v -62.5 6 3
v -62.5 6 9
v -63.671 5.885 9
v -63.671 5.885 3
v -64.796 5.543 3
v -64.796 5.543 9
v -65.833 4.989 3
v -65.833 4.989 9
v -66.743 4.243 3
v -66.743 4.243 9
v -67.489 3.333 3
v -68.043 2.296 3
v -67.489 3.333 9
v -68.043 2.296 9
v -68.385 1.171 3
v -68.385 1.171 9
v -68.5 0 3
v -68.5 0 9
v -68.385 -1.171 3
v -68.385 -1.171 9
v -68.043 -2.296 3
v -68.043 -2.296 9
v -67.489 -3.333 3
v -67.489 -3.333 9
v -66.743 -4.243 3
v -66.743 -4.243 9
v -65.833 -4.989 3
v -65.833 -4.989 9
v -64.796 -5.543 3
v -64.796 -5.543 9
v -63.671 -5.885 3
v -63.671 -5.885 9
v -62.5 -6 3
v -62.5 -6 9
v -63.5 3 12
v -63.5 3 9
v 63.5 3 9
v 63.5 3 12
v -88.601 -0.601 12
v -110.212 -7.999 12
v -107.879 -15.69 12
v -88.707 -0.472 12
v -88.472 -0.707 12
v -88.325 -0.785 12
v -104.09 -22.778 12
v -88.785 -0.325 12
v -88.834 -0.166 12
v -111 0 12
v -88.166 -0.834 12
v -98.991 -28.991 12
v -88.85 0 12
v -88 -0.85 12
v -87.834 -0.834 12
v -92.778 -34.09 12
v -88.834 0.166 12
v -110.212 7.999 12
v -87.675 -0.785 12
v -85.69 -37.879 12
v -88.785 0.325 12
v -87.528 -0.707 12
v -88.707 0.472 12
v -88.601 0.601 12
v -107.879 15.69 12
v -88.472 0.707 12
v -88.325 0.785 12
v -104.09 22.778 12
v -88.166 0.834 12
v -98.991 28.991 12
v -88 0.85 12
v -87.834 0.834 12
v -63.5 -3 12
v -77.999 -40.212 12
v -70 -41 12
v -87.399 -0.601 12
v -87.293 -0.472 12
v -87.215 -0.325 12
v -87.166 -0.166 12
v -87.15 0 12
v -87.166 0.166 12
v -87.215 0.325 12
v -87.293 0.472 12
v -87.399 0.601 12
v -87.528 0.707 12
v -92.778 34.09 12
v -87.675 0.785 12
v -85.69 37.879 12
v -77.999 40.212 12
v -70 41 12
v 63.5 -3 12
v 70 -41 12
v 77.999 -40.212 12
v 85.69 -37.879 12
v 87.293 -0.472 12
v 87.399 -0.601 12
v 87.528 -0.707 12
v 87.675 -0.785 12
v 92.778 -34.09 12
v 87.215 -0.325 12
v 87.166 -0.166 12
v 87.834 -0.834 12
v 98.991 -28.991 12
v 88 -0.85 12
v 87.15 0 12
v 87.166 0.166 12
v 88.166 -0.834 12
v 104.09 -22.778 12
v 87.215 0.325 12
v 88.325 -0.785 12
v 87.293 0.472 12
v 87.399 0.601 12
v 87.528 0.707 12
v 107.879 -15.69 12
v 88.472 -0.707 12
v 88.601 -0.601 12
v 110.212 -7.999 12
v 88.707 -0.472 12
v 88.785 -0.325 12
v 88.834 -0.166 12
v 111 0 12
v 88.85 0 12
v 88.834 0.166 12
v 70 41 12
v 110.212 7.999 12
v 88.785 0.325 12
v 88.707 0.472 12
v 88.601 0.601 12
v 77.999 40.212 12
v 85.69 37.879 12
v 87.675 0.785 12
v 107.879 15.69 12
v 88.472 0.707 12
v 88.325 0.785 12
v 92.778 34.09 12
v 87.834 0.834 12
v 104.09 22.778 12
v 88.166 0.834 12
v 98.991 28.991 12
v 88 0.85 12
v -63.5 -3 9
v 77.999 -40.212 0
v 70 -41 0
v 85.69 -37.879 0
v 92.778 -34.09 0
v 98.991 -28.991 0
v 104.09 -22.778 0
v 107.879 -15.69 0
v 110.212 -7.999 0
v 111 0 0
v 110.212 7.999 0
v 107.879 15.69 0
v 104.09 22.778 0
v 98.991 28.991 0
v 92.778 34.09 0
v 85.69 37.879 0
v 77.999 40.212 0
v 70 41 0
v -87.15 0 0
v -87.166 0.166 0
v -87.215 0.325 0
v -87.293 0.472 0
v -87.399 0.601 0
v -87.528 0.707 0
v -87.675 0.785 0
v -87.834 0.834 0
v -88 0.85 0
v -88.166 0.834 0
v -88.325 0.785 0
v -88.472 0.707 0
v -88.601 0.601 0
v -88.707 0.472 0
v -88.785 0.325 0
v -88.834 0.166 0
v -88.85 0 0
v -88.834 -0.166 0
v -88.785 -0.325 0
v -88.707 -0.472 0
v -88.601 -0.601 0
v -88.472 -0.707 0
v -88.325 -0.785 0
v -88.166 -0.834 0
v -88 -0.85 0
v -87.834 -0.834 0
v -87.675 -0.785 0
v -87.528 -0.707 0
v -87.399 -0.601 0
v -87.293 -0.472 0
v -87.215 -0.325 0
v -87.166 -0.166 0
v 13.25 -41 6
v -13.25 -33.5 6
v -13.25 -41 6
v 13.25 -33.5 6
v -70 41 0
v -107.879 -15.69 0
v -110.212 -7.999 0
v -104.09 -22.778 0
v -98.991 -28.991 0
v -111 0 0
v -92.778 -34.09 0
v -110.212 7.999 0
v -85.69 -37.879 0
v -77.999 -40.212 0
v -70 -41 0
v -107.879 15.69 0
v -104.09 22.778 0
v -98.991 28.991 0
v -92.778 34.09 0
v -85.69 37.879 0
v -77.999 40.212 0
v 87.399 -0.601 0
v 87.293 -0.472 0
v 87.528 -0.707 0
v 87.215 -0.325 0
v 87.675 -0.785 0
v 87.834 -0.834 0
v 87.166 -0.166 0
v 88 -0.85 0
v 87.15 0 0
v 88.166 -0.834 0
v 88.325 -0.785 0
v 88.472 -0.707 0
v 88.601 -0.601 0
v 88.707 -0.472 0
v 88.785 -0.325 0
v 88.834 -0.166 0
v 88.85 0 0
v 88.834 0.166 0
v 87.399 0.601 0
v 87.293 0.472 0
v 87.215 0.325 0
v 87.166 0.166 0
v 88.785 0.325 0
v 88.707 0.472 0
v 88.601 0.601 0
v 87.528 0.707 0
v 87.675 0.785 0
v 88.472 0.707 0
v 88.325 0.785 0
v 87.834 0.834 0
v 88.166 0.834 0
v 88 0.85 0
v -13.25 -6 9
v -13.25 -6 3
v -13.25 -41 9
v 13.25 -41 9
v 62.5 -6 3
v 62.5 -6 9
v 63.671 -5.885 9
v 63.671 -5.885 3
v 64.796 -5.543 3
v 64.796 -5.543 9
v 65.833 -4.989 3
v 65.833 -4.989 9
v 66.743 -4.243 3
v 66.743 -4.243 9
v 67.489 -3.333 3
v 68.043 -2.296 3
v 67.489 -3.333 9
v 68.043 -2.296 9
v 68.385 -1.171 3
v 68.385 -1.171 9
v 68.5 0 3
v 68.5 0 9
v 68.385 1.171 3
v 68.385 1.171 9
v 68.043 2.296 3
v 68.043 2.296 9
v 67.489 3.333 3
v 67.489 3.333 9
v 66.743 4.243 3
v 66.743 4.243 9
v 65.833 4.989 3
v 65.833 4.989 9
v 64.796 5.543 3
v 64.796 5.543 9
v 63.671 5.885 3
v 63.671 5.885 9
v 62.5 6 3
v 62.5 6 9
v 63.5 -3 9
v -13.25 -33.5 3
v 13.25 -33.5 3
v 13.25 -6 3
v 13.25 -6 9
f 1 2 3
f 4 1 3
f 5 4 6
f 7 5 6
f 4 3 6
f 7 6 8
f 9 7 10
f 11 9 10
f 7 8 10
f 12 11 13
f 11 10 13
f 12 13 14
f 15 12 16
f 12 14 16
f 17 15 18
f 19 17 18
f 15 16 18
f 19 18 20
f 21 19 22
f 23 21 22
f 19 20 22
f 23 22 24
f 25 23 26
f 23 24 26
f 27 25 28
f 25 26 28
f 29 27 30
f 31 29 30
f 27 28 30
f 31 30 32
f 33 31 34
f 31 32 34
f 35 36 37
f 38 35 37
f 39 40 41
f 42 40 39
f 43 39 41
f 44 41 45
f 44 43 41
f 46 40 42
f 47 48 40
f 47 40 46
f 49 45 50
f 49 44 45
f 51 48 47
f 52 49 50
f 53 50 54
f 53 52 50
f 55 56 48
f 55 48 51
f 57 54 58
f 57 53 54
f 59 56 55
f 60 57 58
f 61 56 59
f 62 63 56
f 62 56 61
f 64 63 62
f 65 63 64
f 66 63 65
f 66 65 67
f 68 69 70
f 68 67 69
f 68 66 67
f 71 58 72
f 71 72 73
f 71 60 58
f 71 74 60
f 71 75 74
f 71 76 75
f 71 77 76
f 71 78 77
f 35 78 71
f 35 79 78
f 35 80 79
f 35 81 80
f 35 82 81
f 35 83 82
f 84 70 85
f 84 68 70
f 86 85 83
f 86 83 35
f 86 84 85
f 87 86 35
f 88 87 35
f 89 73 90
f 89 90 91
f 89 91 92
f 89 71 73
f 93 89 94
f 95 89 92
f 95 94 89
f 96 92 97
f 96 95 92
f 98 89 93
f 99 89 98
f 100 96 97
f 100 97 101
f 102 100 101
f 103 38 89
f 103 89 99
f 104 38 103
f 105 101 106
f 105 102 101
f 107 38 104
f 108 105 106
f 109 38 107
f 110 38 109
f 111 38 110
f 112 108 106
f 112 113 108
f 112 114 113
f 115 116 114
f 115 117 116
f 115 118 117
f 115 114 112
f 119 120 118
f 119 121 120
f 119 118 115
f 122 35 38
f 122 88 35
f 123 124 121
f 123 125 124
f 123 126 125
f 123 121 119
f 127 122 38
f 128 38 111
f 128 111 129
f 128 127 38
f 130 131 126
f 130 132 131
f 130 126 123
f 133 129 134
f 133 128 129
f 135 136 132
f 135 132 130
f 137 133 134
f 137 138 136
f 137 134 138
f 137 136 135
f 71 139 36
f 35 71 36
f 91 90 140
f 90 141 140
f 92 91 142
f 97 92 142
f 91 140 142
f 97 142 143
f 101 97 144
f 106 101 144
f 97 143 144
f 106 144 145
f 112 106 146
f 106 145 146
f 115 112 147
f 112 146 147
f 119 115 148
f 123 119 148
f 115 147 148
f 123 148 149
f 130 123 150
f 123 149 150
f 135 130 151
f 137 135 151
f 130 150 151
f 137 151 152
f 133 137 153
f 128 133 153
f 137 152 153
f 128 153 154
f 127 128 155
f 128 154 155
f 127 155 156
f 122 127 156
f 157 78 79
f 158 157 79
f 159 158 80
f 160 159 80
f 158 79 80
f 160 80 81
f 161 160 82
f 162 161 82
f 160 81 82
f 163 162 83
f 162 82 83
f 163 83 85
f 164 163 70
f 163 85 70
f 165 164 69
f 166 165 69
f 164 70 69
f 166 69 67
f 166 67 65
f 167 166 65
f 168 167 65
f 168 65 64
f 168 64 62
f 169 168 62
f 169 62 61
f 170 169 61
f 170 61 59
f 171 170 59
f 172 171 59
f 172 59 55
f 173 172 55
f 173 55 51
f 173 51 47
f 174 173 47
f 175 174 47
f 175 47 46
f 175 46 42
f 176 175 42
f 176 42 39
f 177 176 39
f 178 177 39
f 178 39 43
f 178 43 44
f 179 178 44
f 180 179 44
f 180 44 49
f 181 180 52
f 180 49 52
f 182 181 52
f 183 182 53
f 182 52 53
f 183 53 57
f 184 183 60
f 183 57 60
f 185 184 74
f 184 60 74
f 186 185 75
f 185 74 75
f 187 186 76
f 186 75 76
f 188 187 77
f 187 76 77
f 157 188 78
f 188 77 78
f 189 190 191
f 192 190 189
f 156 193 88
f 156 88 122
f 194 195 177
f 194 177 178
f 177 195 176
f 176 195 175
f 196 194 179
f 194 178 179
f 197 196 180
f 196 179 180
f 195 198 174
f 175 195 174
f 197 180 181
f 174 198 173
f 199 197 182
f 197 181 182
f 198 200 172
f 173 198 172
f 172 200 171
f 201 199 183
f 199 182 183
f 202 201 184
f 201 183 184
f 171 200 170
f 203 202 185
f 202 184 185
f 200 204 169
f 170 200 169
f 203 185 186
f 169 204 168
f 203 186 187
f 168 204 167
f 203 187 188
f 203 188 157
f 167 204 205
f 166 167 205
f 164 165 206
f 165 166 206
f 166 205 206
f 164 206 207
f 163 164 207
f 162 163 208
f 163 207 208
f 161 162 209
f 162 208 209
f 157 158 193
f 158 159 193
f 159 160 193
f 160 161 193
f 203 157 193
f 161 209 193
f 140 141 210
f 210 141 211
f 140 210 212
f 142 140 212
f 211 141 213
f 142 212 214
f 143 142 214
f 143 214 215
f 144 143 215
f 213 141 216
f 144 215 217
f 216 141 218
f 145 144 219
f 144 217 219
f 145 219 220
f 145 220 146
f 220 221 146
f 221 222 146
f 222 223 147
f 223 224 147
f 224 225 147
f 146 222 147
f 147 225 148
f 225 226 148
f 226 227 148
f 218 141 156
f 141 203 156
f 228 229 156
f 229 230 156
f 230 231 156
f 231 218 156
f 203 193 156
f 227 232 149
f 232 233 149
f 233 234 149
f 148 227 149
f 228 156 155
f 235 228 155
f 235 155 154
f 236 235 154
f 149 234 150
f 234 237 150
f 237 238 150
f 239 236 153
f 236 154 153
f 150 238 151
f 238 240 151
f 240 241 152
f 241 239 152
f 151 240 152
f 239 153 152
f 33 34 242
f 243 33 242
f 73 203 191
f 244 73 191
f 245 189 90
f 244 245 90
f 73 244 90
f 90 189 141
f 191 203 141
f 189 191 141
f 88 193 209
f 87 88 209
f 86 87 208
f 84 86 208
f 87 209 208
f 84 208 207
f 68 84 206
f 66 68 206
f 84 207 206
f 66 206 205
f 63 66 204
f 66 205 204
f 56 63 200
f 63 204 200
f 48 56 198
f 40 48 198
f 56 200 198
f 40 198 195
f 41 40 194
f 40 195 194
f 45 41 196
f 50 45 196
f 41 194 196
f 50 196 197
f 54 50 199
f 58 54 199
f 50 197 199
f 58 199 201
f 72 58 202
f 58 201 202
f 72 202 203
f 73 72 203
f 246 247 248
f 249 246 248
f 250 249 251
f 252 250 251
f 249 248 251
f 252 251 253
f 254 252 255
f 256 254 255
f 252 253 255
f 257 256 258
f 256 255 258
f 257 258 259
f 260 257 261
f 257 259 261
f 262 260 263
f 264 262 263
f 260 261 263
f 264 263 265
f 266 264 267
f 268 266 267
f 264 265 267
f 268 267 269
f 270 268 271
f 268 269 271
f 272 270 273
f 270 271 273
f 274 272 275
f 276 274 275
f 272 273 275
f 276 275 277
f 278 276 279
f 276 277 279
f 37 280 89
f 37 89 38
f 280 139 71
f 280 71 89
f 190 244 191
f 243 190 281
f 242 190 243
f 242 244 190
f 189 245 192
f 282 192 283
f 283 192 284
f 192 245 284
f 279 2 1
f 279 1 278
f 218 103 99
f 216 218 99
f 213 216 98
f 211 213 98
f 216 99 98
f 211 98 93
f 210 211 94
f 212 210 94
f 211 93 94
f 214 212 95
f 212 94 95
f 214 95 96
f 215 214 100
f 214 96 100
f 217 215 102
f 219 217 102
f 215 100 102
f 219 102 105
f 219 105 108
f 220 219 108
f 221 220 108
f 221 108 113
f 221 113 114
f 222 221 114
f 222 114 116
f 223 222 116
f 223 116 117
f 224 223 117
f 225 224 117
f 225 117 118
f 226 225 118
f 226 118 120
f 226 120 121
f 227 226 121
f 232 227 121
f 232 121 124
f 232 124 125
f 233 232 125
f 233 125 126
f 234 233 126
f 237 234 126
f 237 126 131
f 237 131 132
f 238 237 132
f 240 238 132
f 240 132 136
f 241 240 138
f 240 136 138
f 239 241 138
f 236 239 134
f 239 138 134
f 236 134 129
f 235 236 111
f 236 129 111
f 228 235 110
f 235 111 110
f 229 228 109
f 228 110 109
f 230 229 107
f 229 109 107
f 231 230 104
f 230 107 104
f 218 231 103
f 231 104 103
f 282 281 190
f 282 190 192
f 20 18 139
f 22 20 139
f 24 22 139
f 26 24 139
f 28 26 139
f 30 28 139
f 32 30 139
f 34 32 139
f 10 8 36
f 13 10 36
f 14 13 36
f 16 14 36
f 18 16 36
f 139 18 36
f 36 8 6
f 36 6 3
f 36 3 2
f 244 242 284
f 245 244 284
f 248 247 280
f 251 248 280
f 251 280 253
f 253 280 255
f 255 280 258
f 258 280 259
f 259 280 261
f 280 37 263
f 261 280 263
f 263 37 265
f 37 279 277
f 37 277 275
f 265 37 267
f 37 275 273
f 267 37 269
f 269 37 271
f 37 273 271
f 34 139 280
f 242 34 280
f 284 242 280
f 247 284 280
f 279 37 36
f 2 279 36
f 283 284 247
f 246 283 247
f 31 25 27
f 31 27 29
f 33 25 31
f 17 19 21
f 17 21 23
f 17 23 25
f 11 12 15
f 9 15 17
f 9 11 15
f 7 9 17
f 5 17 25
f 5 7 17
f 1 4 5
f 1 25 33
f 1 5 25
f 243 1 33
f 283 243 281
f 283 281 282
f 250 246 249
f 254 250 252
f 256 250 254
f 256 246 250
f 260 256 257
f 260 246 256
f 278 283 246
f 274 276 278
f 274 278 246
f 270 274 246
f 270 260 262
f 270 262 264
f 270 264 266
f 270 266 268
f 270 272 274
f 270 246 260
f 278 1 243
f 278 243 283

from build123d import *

# Parameters (mm, degrees)
PAD_DEPTH          = 9
POCKET_DEPTH       = 6
SKETCH002_W        = 26.5
SKETCH002_H        = 35
POCKET001_DEPTH    = 6
SKETCH003_W        = 127
SKETCH003_H        = 6
PAD001_DEPTH       = 3
SKETCH004_R        = 0.85
POCKET002_DEPTH    = 485.929265
POLARPATTERN_COUNT = 2
SKETCH005_W        = 26.5
SKETCH005_H        = 7.5
PAD002_DEPTH       = 3


with BuildPart() as part:
    # Sketch → Pad (new body)
    with BuildSketch(Plane.XY):
        with BuildLine():
            ThreePointArc((-70, 41), (-111, 0), (-70, -41))
            Line((-70, -41), (70, -41))
            ThreePointArc((70, -41), (111, 0), (70, 41))
            Line((-70, 41), (70, 41))
        make_face()
    extrude(amount=PAD_DEPTH)

    # Sketch001 (on Face6 of Pad) → Pocket (cut)
    with BuildSketch(Plane.XY.offset(9)):
        with BuildLine():
            ThreePointArc((-62.5, 6), (-68.5, 0), (-62.5, -6))
            Line((-62.5, -6), (62.5, -6))
            ThreePointArc((62.5, -6), (68.5, 0), (62.5, 6))
            Line((-62.5, 6), (62.5, 6))
        make_face()
    extrude(amount=-POCKET_DEPTH, mode=Mode.SUBTRACT)

    # Sketch002 (on Face5 of Pocket) → Pocket001 (cut)
    with BuildSketch(Plane.XY.offset(9)):
        with Locations((0, -23.5)):
            Rectangle(SKETCH002_W, SKETCH002_H)
    extrude(amount=-POCKET001_DEPTH, mode=Mode.SUBTRACT)

    # Sketch003 (on Face5 of Pocket001) → Pad001 (join)
    with BuildSketch(Plane.XY.offset(9)):
        with BuildLine():
            ThreePointArc((-70, 41), (-111, 0), (-70, -41))
            Line((-70, -41), (70, -41))
            ThreePointArc((70, -41), (111, 0), (70, 41))
            Line((-70, 41), (70, 41))
        make_face()
        Rectangle(SKETCH003_W, SKETCH003_H, mode=Mode.SUBTRACT)
    extrude(amount=PAD001_DEPTH)

    # Sketch004 (on Face12 of Pad001) → Pocket002 (cut, through all)
    with BuildSketch(Plane.XY.offset(12)):
        with Locations((-88, 0)):
            Circle(SKETCH004_R)
    pocket002 = extrude(amount=-POCKET002_DEPTH, mode=Mode.SUBTRACT)

    # PolarPattern: Pocket002 ×2 about axis
    polarpattern_axis = Axis((0, 0, 12), (0, 0, 1))
    for i in range(1, POLARPATTERN_COUNT):
        add(pocket002.rotate(polarpattern_axis, i * 360 / POLARPATTERN_COUNT), mode=Mode.SUBTRACT)

    # Sketch005 (on Face10 of PolarPattern) → Pad002 (join)
    with BuildSketch(Plane.XY.offset(3)):
        with Locations((0, -37.25)):
            Rectangle(SKETCH005_W, SKETCH005_H)
    extrude(amount=PAD002_DEPTH)


solid = part.part
